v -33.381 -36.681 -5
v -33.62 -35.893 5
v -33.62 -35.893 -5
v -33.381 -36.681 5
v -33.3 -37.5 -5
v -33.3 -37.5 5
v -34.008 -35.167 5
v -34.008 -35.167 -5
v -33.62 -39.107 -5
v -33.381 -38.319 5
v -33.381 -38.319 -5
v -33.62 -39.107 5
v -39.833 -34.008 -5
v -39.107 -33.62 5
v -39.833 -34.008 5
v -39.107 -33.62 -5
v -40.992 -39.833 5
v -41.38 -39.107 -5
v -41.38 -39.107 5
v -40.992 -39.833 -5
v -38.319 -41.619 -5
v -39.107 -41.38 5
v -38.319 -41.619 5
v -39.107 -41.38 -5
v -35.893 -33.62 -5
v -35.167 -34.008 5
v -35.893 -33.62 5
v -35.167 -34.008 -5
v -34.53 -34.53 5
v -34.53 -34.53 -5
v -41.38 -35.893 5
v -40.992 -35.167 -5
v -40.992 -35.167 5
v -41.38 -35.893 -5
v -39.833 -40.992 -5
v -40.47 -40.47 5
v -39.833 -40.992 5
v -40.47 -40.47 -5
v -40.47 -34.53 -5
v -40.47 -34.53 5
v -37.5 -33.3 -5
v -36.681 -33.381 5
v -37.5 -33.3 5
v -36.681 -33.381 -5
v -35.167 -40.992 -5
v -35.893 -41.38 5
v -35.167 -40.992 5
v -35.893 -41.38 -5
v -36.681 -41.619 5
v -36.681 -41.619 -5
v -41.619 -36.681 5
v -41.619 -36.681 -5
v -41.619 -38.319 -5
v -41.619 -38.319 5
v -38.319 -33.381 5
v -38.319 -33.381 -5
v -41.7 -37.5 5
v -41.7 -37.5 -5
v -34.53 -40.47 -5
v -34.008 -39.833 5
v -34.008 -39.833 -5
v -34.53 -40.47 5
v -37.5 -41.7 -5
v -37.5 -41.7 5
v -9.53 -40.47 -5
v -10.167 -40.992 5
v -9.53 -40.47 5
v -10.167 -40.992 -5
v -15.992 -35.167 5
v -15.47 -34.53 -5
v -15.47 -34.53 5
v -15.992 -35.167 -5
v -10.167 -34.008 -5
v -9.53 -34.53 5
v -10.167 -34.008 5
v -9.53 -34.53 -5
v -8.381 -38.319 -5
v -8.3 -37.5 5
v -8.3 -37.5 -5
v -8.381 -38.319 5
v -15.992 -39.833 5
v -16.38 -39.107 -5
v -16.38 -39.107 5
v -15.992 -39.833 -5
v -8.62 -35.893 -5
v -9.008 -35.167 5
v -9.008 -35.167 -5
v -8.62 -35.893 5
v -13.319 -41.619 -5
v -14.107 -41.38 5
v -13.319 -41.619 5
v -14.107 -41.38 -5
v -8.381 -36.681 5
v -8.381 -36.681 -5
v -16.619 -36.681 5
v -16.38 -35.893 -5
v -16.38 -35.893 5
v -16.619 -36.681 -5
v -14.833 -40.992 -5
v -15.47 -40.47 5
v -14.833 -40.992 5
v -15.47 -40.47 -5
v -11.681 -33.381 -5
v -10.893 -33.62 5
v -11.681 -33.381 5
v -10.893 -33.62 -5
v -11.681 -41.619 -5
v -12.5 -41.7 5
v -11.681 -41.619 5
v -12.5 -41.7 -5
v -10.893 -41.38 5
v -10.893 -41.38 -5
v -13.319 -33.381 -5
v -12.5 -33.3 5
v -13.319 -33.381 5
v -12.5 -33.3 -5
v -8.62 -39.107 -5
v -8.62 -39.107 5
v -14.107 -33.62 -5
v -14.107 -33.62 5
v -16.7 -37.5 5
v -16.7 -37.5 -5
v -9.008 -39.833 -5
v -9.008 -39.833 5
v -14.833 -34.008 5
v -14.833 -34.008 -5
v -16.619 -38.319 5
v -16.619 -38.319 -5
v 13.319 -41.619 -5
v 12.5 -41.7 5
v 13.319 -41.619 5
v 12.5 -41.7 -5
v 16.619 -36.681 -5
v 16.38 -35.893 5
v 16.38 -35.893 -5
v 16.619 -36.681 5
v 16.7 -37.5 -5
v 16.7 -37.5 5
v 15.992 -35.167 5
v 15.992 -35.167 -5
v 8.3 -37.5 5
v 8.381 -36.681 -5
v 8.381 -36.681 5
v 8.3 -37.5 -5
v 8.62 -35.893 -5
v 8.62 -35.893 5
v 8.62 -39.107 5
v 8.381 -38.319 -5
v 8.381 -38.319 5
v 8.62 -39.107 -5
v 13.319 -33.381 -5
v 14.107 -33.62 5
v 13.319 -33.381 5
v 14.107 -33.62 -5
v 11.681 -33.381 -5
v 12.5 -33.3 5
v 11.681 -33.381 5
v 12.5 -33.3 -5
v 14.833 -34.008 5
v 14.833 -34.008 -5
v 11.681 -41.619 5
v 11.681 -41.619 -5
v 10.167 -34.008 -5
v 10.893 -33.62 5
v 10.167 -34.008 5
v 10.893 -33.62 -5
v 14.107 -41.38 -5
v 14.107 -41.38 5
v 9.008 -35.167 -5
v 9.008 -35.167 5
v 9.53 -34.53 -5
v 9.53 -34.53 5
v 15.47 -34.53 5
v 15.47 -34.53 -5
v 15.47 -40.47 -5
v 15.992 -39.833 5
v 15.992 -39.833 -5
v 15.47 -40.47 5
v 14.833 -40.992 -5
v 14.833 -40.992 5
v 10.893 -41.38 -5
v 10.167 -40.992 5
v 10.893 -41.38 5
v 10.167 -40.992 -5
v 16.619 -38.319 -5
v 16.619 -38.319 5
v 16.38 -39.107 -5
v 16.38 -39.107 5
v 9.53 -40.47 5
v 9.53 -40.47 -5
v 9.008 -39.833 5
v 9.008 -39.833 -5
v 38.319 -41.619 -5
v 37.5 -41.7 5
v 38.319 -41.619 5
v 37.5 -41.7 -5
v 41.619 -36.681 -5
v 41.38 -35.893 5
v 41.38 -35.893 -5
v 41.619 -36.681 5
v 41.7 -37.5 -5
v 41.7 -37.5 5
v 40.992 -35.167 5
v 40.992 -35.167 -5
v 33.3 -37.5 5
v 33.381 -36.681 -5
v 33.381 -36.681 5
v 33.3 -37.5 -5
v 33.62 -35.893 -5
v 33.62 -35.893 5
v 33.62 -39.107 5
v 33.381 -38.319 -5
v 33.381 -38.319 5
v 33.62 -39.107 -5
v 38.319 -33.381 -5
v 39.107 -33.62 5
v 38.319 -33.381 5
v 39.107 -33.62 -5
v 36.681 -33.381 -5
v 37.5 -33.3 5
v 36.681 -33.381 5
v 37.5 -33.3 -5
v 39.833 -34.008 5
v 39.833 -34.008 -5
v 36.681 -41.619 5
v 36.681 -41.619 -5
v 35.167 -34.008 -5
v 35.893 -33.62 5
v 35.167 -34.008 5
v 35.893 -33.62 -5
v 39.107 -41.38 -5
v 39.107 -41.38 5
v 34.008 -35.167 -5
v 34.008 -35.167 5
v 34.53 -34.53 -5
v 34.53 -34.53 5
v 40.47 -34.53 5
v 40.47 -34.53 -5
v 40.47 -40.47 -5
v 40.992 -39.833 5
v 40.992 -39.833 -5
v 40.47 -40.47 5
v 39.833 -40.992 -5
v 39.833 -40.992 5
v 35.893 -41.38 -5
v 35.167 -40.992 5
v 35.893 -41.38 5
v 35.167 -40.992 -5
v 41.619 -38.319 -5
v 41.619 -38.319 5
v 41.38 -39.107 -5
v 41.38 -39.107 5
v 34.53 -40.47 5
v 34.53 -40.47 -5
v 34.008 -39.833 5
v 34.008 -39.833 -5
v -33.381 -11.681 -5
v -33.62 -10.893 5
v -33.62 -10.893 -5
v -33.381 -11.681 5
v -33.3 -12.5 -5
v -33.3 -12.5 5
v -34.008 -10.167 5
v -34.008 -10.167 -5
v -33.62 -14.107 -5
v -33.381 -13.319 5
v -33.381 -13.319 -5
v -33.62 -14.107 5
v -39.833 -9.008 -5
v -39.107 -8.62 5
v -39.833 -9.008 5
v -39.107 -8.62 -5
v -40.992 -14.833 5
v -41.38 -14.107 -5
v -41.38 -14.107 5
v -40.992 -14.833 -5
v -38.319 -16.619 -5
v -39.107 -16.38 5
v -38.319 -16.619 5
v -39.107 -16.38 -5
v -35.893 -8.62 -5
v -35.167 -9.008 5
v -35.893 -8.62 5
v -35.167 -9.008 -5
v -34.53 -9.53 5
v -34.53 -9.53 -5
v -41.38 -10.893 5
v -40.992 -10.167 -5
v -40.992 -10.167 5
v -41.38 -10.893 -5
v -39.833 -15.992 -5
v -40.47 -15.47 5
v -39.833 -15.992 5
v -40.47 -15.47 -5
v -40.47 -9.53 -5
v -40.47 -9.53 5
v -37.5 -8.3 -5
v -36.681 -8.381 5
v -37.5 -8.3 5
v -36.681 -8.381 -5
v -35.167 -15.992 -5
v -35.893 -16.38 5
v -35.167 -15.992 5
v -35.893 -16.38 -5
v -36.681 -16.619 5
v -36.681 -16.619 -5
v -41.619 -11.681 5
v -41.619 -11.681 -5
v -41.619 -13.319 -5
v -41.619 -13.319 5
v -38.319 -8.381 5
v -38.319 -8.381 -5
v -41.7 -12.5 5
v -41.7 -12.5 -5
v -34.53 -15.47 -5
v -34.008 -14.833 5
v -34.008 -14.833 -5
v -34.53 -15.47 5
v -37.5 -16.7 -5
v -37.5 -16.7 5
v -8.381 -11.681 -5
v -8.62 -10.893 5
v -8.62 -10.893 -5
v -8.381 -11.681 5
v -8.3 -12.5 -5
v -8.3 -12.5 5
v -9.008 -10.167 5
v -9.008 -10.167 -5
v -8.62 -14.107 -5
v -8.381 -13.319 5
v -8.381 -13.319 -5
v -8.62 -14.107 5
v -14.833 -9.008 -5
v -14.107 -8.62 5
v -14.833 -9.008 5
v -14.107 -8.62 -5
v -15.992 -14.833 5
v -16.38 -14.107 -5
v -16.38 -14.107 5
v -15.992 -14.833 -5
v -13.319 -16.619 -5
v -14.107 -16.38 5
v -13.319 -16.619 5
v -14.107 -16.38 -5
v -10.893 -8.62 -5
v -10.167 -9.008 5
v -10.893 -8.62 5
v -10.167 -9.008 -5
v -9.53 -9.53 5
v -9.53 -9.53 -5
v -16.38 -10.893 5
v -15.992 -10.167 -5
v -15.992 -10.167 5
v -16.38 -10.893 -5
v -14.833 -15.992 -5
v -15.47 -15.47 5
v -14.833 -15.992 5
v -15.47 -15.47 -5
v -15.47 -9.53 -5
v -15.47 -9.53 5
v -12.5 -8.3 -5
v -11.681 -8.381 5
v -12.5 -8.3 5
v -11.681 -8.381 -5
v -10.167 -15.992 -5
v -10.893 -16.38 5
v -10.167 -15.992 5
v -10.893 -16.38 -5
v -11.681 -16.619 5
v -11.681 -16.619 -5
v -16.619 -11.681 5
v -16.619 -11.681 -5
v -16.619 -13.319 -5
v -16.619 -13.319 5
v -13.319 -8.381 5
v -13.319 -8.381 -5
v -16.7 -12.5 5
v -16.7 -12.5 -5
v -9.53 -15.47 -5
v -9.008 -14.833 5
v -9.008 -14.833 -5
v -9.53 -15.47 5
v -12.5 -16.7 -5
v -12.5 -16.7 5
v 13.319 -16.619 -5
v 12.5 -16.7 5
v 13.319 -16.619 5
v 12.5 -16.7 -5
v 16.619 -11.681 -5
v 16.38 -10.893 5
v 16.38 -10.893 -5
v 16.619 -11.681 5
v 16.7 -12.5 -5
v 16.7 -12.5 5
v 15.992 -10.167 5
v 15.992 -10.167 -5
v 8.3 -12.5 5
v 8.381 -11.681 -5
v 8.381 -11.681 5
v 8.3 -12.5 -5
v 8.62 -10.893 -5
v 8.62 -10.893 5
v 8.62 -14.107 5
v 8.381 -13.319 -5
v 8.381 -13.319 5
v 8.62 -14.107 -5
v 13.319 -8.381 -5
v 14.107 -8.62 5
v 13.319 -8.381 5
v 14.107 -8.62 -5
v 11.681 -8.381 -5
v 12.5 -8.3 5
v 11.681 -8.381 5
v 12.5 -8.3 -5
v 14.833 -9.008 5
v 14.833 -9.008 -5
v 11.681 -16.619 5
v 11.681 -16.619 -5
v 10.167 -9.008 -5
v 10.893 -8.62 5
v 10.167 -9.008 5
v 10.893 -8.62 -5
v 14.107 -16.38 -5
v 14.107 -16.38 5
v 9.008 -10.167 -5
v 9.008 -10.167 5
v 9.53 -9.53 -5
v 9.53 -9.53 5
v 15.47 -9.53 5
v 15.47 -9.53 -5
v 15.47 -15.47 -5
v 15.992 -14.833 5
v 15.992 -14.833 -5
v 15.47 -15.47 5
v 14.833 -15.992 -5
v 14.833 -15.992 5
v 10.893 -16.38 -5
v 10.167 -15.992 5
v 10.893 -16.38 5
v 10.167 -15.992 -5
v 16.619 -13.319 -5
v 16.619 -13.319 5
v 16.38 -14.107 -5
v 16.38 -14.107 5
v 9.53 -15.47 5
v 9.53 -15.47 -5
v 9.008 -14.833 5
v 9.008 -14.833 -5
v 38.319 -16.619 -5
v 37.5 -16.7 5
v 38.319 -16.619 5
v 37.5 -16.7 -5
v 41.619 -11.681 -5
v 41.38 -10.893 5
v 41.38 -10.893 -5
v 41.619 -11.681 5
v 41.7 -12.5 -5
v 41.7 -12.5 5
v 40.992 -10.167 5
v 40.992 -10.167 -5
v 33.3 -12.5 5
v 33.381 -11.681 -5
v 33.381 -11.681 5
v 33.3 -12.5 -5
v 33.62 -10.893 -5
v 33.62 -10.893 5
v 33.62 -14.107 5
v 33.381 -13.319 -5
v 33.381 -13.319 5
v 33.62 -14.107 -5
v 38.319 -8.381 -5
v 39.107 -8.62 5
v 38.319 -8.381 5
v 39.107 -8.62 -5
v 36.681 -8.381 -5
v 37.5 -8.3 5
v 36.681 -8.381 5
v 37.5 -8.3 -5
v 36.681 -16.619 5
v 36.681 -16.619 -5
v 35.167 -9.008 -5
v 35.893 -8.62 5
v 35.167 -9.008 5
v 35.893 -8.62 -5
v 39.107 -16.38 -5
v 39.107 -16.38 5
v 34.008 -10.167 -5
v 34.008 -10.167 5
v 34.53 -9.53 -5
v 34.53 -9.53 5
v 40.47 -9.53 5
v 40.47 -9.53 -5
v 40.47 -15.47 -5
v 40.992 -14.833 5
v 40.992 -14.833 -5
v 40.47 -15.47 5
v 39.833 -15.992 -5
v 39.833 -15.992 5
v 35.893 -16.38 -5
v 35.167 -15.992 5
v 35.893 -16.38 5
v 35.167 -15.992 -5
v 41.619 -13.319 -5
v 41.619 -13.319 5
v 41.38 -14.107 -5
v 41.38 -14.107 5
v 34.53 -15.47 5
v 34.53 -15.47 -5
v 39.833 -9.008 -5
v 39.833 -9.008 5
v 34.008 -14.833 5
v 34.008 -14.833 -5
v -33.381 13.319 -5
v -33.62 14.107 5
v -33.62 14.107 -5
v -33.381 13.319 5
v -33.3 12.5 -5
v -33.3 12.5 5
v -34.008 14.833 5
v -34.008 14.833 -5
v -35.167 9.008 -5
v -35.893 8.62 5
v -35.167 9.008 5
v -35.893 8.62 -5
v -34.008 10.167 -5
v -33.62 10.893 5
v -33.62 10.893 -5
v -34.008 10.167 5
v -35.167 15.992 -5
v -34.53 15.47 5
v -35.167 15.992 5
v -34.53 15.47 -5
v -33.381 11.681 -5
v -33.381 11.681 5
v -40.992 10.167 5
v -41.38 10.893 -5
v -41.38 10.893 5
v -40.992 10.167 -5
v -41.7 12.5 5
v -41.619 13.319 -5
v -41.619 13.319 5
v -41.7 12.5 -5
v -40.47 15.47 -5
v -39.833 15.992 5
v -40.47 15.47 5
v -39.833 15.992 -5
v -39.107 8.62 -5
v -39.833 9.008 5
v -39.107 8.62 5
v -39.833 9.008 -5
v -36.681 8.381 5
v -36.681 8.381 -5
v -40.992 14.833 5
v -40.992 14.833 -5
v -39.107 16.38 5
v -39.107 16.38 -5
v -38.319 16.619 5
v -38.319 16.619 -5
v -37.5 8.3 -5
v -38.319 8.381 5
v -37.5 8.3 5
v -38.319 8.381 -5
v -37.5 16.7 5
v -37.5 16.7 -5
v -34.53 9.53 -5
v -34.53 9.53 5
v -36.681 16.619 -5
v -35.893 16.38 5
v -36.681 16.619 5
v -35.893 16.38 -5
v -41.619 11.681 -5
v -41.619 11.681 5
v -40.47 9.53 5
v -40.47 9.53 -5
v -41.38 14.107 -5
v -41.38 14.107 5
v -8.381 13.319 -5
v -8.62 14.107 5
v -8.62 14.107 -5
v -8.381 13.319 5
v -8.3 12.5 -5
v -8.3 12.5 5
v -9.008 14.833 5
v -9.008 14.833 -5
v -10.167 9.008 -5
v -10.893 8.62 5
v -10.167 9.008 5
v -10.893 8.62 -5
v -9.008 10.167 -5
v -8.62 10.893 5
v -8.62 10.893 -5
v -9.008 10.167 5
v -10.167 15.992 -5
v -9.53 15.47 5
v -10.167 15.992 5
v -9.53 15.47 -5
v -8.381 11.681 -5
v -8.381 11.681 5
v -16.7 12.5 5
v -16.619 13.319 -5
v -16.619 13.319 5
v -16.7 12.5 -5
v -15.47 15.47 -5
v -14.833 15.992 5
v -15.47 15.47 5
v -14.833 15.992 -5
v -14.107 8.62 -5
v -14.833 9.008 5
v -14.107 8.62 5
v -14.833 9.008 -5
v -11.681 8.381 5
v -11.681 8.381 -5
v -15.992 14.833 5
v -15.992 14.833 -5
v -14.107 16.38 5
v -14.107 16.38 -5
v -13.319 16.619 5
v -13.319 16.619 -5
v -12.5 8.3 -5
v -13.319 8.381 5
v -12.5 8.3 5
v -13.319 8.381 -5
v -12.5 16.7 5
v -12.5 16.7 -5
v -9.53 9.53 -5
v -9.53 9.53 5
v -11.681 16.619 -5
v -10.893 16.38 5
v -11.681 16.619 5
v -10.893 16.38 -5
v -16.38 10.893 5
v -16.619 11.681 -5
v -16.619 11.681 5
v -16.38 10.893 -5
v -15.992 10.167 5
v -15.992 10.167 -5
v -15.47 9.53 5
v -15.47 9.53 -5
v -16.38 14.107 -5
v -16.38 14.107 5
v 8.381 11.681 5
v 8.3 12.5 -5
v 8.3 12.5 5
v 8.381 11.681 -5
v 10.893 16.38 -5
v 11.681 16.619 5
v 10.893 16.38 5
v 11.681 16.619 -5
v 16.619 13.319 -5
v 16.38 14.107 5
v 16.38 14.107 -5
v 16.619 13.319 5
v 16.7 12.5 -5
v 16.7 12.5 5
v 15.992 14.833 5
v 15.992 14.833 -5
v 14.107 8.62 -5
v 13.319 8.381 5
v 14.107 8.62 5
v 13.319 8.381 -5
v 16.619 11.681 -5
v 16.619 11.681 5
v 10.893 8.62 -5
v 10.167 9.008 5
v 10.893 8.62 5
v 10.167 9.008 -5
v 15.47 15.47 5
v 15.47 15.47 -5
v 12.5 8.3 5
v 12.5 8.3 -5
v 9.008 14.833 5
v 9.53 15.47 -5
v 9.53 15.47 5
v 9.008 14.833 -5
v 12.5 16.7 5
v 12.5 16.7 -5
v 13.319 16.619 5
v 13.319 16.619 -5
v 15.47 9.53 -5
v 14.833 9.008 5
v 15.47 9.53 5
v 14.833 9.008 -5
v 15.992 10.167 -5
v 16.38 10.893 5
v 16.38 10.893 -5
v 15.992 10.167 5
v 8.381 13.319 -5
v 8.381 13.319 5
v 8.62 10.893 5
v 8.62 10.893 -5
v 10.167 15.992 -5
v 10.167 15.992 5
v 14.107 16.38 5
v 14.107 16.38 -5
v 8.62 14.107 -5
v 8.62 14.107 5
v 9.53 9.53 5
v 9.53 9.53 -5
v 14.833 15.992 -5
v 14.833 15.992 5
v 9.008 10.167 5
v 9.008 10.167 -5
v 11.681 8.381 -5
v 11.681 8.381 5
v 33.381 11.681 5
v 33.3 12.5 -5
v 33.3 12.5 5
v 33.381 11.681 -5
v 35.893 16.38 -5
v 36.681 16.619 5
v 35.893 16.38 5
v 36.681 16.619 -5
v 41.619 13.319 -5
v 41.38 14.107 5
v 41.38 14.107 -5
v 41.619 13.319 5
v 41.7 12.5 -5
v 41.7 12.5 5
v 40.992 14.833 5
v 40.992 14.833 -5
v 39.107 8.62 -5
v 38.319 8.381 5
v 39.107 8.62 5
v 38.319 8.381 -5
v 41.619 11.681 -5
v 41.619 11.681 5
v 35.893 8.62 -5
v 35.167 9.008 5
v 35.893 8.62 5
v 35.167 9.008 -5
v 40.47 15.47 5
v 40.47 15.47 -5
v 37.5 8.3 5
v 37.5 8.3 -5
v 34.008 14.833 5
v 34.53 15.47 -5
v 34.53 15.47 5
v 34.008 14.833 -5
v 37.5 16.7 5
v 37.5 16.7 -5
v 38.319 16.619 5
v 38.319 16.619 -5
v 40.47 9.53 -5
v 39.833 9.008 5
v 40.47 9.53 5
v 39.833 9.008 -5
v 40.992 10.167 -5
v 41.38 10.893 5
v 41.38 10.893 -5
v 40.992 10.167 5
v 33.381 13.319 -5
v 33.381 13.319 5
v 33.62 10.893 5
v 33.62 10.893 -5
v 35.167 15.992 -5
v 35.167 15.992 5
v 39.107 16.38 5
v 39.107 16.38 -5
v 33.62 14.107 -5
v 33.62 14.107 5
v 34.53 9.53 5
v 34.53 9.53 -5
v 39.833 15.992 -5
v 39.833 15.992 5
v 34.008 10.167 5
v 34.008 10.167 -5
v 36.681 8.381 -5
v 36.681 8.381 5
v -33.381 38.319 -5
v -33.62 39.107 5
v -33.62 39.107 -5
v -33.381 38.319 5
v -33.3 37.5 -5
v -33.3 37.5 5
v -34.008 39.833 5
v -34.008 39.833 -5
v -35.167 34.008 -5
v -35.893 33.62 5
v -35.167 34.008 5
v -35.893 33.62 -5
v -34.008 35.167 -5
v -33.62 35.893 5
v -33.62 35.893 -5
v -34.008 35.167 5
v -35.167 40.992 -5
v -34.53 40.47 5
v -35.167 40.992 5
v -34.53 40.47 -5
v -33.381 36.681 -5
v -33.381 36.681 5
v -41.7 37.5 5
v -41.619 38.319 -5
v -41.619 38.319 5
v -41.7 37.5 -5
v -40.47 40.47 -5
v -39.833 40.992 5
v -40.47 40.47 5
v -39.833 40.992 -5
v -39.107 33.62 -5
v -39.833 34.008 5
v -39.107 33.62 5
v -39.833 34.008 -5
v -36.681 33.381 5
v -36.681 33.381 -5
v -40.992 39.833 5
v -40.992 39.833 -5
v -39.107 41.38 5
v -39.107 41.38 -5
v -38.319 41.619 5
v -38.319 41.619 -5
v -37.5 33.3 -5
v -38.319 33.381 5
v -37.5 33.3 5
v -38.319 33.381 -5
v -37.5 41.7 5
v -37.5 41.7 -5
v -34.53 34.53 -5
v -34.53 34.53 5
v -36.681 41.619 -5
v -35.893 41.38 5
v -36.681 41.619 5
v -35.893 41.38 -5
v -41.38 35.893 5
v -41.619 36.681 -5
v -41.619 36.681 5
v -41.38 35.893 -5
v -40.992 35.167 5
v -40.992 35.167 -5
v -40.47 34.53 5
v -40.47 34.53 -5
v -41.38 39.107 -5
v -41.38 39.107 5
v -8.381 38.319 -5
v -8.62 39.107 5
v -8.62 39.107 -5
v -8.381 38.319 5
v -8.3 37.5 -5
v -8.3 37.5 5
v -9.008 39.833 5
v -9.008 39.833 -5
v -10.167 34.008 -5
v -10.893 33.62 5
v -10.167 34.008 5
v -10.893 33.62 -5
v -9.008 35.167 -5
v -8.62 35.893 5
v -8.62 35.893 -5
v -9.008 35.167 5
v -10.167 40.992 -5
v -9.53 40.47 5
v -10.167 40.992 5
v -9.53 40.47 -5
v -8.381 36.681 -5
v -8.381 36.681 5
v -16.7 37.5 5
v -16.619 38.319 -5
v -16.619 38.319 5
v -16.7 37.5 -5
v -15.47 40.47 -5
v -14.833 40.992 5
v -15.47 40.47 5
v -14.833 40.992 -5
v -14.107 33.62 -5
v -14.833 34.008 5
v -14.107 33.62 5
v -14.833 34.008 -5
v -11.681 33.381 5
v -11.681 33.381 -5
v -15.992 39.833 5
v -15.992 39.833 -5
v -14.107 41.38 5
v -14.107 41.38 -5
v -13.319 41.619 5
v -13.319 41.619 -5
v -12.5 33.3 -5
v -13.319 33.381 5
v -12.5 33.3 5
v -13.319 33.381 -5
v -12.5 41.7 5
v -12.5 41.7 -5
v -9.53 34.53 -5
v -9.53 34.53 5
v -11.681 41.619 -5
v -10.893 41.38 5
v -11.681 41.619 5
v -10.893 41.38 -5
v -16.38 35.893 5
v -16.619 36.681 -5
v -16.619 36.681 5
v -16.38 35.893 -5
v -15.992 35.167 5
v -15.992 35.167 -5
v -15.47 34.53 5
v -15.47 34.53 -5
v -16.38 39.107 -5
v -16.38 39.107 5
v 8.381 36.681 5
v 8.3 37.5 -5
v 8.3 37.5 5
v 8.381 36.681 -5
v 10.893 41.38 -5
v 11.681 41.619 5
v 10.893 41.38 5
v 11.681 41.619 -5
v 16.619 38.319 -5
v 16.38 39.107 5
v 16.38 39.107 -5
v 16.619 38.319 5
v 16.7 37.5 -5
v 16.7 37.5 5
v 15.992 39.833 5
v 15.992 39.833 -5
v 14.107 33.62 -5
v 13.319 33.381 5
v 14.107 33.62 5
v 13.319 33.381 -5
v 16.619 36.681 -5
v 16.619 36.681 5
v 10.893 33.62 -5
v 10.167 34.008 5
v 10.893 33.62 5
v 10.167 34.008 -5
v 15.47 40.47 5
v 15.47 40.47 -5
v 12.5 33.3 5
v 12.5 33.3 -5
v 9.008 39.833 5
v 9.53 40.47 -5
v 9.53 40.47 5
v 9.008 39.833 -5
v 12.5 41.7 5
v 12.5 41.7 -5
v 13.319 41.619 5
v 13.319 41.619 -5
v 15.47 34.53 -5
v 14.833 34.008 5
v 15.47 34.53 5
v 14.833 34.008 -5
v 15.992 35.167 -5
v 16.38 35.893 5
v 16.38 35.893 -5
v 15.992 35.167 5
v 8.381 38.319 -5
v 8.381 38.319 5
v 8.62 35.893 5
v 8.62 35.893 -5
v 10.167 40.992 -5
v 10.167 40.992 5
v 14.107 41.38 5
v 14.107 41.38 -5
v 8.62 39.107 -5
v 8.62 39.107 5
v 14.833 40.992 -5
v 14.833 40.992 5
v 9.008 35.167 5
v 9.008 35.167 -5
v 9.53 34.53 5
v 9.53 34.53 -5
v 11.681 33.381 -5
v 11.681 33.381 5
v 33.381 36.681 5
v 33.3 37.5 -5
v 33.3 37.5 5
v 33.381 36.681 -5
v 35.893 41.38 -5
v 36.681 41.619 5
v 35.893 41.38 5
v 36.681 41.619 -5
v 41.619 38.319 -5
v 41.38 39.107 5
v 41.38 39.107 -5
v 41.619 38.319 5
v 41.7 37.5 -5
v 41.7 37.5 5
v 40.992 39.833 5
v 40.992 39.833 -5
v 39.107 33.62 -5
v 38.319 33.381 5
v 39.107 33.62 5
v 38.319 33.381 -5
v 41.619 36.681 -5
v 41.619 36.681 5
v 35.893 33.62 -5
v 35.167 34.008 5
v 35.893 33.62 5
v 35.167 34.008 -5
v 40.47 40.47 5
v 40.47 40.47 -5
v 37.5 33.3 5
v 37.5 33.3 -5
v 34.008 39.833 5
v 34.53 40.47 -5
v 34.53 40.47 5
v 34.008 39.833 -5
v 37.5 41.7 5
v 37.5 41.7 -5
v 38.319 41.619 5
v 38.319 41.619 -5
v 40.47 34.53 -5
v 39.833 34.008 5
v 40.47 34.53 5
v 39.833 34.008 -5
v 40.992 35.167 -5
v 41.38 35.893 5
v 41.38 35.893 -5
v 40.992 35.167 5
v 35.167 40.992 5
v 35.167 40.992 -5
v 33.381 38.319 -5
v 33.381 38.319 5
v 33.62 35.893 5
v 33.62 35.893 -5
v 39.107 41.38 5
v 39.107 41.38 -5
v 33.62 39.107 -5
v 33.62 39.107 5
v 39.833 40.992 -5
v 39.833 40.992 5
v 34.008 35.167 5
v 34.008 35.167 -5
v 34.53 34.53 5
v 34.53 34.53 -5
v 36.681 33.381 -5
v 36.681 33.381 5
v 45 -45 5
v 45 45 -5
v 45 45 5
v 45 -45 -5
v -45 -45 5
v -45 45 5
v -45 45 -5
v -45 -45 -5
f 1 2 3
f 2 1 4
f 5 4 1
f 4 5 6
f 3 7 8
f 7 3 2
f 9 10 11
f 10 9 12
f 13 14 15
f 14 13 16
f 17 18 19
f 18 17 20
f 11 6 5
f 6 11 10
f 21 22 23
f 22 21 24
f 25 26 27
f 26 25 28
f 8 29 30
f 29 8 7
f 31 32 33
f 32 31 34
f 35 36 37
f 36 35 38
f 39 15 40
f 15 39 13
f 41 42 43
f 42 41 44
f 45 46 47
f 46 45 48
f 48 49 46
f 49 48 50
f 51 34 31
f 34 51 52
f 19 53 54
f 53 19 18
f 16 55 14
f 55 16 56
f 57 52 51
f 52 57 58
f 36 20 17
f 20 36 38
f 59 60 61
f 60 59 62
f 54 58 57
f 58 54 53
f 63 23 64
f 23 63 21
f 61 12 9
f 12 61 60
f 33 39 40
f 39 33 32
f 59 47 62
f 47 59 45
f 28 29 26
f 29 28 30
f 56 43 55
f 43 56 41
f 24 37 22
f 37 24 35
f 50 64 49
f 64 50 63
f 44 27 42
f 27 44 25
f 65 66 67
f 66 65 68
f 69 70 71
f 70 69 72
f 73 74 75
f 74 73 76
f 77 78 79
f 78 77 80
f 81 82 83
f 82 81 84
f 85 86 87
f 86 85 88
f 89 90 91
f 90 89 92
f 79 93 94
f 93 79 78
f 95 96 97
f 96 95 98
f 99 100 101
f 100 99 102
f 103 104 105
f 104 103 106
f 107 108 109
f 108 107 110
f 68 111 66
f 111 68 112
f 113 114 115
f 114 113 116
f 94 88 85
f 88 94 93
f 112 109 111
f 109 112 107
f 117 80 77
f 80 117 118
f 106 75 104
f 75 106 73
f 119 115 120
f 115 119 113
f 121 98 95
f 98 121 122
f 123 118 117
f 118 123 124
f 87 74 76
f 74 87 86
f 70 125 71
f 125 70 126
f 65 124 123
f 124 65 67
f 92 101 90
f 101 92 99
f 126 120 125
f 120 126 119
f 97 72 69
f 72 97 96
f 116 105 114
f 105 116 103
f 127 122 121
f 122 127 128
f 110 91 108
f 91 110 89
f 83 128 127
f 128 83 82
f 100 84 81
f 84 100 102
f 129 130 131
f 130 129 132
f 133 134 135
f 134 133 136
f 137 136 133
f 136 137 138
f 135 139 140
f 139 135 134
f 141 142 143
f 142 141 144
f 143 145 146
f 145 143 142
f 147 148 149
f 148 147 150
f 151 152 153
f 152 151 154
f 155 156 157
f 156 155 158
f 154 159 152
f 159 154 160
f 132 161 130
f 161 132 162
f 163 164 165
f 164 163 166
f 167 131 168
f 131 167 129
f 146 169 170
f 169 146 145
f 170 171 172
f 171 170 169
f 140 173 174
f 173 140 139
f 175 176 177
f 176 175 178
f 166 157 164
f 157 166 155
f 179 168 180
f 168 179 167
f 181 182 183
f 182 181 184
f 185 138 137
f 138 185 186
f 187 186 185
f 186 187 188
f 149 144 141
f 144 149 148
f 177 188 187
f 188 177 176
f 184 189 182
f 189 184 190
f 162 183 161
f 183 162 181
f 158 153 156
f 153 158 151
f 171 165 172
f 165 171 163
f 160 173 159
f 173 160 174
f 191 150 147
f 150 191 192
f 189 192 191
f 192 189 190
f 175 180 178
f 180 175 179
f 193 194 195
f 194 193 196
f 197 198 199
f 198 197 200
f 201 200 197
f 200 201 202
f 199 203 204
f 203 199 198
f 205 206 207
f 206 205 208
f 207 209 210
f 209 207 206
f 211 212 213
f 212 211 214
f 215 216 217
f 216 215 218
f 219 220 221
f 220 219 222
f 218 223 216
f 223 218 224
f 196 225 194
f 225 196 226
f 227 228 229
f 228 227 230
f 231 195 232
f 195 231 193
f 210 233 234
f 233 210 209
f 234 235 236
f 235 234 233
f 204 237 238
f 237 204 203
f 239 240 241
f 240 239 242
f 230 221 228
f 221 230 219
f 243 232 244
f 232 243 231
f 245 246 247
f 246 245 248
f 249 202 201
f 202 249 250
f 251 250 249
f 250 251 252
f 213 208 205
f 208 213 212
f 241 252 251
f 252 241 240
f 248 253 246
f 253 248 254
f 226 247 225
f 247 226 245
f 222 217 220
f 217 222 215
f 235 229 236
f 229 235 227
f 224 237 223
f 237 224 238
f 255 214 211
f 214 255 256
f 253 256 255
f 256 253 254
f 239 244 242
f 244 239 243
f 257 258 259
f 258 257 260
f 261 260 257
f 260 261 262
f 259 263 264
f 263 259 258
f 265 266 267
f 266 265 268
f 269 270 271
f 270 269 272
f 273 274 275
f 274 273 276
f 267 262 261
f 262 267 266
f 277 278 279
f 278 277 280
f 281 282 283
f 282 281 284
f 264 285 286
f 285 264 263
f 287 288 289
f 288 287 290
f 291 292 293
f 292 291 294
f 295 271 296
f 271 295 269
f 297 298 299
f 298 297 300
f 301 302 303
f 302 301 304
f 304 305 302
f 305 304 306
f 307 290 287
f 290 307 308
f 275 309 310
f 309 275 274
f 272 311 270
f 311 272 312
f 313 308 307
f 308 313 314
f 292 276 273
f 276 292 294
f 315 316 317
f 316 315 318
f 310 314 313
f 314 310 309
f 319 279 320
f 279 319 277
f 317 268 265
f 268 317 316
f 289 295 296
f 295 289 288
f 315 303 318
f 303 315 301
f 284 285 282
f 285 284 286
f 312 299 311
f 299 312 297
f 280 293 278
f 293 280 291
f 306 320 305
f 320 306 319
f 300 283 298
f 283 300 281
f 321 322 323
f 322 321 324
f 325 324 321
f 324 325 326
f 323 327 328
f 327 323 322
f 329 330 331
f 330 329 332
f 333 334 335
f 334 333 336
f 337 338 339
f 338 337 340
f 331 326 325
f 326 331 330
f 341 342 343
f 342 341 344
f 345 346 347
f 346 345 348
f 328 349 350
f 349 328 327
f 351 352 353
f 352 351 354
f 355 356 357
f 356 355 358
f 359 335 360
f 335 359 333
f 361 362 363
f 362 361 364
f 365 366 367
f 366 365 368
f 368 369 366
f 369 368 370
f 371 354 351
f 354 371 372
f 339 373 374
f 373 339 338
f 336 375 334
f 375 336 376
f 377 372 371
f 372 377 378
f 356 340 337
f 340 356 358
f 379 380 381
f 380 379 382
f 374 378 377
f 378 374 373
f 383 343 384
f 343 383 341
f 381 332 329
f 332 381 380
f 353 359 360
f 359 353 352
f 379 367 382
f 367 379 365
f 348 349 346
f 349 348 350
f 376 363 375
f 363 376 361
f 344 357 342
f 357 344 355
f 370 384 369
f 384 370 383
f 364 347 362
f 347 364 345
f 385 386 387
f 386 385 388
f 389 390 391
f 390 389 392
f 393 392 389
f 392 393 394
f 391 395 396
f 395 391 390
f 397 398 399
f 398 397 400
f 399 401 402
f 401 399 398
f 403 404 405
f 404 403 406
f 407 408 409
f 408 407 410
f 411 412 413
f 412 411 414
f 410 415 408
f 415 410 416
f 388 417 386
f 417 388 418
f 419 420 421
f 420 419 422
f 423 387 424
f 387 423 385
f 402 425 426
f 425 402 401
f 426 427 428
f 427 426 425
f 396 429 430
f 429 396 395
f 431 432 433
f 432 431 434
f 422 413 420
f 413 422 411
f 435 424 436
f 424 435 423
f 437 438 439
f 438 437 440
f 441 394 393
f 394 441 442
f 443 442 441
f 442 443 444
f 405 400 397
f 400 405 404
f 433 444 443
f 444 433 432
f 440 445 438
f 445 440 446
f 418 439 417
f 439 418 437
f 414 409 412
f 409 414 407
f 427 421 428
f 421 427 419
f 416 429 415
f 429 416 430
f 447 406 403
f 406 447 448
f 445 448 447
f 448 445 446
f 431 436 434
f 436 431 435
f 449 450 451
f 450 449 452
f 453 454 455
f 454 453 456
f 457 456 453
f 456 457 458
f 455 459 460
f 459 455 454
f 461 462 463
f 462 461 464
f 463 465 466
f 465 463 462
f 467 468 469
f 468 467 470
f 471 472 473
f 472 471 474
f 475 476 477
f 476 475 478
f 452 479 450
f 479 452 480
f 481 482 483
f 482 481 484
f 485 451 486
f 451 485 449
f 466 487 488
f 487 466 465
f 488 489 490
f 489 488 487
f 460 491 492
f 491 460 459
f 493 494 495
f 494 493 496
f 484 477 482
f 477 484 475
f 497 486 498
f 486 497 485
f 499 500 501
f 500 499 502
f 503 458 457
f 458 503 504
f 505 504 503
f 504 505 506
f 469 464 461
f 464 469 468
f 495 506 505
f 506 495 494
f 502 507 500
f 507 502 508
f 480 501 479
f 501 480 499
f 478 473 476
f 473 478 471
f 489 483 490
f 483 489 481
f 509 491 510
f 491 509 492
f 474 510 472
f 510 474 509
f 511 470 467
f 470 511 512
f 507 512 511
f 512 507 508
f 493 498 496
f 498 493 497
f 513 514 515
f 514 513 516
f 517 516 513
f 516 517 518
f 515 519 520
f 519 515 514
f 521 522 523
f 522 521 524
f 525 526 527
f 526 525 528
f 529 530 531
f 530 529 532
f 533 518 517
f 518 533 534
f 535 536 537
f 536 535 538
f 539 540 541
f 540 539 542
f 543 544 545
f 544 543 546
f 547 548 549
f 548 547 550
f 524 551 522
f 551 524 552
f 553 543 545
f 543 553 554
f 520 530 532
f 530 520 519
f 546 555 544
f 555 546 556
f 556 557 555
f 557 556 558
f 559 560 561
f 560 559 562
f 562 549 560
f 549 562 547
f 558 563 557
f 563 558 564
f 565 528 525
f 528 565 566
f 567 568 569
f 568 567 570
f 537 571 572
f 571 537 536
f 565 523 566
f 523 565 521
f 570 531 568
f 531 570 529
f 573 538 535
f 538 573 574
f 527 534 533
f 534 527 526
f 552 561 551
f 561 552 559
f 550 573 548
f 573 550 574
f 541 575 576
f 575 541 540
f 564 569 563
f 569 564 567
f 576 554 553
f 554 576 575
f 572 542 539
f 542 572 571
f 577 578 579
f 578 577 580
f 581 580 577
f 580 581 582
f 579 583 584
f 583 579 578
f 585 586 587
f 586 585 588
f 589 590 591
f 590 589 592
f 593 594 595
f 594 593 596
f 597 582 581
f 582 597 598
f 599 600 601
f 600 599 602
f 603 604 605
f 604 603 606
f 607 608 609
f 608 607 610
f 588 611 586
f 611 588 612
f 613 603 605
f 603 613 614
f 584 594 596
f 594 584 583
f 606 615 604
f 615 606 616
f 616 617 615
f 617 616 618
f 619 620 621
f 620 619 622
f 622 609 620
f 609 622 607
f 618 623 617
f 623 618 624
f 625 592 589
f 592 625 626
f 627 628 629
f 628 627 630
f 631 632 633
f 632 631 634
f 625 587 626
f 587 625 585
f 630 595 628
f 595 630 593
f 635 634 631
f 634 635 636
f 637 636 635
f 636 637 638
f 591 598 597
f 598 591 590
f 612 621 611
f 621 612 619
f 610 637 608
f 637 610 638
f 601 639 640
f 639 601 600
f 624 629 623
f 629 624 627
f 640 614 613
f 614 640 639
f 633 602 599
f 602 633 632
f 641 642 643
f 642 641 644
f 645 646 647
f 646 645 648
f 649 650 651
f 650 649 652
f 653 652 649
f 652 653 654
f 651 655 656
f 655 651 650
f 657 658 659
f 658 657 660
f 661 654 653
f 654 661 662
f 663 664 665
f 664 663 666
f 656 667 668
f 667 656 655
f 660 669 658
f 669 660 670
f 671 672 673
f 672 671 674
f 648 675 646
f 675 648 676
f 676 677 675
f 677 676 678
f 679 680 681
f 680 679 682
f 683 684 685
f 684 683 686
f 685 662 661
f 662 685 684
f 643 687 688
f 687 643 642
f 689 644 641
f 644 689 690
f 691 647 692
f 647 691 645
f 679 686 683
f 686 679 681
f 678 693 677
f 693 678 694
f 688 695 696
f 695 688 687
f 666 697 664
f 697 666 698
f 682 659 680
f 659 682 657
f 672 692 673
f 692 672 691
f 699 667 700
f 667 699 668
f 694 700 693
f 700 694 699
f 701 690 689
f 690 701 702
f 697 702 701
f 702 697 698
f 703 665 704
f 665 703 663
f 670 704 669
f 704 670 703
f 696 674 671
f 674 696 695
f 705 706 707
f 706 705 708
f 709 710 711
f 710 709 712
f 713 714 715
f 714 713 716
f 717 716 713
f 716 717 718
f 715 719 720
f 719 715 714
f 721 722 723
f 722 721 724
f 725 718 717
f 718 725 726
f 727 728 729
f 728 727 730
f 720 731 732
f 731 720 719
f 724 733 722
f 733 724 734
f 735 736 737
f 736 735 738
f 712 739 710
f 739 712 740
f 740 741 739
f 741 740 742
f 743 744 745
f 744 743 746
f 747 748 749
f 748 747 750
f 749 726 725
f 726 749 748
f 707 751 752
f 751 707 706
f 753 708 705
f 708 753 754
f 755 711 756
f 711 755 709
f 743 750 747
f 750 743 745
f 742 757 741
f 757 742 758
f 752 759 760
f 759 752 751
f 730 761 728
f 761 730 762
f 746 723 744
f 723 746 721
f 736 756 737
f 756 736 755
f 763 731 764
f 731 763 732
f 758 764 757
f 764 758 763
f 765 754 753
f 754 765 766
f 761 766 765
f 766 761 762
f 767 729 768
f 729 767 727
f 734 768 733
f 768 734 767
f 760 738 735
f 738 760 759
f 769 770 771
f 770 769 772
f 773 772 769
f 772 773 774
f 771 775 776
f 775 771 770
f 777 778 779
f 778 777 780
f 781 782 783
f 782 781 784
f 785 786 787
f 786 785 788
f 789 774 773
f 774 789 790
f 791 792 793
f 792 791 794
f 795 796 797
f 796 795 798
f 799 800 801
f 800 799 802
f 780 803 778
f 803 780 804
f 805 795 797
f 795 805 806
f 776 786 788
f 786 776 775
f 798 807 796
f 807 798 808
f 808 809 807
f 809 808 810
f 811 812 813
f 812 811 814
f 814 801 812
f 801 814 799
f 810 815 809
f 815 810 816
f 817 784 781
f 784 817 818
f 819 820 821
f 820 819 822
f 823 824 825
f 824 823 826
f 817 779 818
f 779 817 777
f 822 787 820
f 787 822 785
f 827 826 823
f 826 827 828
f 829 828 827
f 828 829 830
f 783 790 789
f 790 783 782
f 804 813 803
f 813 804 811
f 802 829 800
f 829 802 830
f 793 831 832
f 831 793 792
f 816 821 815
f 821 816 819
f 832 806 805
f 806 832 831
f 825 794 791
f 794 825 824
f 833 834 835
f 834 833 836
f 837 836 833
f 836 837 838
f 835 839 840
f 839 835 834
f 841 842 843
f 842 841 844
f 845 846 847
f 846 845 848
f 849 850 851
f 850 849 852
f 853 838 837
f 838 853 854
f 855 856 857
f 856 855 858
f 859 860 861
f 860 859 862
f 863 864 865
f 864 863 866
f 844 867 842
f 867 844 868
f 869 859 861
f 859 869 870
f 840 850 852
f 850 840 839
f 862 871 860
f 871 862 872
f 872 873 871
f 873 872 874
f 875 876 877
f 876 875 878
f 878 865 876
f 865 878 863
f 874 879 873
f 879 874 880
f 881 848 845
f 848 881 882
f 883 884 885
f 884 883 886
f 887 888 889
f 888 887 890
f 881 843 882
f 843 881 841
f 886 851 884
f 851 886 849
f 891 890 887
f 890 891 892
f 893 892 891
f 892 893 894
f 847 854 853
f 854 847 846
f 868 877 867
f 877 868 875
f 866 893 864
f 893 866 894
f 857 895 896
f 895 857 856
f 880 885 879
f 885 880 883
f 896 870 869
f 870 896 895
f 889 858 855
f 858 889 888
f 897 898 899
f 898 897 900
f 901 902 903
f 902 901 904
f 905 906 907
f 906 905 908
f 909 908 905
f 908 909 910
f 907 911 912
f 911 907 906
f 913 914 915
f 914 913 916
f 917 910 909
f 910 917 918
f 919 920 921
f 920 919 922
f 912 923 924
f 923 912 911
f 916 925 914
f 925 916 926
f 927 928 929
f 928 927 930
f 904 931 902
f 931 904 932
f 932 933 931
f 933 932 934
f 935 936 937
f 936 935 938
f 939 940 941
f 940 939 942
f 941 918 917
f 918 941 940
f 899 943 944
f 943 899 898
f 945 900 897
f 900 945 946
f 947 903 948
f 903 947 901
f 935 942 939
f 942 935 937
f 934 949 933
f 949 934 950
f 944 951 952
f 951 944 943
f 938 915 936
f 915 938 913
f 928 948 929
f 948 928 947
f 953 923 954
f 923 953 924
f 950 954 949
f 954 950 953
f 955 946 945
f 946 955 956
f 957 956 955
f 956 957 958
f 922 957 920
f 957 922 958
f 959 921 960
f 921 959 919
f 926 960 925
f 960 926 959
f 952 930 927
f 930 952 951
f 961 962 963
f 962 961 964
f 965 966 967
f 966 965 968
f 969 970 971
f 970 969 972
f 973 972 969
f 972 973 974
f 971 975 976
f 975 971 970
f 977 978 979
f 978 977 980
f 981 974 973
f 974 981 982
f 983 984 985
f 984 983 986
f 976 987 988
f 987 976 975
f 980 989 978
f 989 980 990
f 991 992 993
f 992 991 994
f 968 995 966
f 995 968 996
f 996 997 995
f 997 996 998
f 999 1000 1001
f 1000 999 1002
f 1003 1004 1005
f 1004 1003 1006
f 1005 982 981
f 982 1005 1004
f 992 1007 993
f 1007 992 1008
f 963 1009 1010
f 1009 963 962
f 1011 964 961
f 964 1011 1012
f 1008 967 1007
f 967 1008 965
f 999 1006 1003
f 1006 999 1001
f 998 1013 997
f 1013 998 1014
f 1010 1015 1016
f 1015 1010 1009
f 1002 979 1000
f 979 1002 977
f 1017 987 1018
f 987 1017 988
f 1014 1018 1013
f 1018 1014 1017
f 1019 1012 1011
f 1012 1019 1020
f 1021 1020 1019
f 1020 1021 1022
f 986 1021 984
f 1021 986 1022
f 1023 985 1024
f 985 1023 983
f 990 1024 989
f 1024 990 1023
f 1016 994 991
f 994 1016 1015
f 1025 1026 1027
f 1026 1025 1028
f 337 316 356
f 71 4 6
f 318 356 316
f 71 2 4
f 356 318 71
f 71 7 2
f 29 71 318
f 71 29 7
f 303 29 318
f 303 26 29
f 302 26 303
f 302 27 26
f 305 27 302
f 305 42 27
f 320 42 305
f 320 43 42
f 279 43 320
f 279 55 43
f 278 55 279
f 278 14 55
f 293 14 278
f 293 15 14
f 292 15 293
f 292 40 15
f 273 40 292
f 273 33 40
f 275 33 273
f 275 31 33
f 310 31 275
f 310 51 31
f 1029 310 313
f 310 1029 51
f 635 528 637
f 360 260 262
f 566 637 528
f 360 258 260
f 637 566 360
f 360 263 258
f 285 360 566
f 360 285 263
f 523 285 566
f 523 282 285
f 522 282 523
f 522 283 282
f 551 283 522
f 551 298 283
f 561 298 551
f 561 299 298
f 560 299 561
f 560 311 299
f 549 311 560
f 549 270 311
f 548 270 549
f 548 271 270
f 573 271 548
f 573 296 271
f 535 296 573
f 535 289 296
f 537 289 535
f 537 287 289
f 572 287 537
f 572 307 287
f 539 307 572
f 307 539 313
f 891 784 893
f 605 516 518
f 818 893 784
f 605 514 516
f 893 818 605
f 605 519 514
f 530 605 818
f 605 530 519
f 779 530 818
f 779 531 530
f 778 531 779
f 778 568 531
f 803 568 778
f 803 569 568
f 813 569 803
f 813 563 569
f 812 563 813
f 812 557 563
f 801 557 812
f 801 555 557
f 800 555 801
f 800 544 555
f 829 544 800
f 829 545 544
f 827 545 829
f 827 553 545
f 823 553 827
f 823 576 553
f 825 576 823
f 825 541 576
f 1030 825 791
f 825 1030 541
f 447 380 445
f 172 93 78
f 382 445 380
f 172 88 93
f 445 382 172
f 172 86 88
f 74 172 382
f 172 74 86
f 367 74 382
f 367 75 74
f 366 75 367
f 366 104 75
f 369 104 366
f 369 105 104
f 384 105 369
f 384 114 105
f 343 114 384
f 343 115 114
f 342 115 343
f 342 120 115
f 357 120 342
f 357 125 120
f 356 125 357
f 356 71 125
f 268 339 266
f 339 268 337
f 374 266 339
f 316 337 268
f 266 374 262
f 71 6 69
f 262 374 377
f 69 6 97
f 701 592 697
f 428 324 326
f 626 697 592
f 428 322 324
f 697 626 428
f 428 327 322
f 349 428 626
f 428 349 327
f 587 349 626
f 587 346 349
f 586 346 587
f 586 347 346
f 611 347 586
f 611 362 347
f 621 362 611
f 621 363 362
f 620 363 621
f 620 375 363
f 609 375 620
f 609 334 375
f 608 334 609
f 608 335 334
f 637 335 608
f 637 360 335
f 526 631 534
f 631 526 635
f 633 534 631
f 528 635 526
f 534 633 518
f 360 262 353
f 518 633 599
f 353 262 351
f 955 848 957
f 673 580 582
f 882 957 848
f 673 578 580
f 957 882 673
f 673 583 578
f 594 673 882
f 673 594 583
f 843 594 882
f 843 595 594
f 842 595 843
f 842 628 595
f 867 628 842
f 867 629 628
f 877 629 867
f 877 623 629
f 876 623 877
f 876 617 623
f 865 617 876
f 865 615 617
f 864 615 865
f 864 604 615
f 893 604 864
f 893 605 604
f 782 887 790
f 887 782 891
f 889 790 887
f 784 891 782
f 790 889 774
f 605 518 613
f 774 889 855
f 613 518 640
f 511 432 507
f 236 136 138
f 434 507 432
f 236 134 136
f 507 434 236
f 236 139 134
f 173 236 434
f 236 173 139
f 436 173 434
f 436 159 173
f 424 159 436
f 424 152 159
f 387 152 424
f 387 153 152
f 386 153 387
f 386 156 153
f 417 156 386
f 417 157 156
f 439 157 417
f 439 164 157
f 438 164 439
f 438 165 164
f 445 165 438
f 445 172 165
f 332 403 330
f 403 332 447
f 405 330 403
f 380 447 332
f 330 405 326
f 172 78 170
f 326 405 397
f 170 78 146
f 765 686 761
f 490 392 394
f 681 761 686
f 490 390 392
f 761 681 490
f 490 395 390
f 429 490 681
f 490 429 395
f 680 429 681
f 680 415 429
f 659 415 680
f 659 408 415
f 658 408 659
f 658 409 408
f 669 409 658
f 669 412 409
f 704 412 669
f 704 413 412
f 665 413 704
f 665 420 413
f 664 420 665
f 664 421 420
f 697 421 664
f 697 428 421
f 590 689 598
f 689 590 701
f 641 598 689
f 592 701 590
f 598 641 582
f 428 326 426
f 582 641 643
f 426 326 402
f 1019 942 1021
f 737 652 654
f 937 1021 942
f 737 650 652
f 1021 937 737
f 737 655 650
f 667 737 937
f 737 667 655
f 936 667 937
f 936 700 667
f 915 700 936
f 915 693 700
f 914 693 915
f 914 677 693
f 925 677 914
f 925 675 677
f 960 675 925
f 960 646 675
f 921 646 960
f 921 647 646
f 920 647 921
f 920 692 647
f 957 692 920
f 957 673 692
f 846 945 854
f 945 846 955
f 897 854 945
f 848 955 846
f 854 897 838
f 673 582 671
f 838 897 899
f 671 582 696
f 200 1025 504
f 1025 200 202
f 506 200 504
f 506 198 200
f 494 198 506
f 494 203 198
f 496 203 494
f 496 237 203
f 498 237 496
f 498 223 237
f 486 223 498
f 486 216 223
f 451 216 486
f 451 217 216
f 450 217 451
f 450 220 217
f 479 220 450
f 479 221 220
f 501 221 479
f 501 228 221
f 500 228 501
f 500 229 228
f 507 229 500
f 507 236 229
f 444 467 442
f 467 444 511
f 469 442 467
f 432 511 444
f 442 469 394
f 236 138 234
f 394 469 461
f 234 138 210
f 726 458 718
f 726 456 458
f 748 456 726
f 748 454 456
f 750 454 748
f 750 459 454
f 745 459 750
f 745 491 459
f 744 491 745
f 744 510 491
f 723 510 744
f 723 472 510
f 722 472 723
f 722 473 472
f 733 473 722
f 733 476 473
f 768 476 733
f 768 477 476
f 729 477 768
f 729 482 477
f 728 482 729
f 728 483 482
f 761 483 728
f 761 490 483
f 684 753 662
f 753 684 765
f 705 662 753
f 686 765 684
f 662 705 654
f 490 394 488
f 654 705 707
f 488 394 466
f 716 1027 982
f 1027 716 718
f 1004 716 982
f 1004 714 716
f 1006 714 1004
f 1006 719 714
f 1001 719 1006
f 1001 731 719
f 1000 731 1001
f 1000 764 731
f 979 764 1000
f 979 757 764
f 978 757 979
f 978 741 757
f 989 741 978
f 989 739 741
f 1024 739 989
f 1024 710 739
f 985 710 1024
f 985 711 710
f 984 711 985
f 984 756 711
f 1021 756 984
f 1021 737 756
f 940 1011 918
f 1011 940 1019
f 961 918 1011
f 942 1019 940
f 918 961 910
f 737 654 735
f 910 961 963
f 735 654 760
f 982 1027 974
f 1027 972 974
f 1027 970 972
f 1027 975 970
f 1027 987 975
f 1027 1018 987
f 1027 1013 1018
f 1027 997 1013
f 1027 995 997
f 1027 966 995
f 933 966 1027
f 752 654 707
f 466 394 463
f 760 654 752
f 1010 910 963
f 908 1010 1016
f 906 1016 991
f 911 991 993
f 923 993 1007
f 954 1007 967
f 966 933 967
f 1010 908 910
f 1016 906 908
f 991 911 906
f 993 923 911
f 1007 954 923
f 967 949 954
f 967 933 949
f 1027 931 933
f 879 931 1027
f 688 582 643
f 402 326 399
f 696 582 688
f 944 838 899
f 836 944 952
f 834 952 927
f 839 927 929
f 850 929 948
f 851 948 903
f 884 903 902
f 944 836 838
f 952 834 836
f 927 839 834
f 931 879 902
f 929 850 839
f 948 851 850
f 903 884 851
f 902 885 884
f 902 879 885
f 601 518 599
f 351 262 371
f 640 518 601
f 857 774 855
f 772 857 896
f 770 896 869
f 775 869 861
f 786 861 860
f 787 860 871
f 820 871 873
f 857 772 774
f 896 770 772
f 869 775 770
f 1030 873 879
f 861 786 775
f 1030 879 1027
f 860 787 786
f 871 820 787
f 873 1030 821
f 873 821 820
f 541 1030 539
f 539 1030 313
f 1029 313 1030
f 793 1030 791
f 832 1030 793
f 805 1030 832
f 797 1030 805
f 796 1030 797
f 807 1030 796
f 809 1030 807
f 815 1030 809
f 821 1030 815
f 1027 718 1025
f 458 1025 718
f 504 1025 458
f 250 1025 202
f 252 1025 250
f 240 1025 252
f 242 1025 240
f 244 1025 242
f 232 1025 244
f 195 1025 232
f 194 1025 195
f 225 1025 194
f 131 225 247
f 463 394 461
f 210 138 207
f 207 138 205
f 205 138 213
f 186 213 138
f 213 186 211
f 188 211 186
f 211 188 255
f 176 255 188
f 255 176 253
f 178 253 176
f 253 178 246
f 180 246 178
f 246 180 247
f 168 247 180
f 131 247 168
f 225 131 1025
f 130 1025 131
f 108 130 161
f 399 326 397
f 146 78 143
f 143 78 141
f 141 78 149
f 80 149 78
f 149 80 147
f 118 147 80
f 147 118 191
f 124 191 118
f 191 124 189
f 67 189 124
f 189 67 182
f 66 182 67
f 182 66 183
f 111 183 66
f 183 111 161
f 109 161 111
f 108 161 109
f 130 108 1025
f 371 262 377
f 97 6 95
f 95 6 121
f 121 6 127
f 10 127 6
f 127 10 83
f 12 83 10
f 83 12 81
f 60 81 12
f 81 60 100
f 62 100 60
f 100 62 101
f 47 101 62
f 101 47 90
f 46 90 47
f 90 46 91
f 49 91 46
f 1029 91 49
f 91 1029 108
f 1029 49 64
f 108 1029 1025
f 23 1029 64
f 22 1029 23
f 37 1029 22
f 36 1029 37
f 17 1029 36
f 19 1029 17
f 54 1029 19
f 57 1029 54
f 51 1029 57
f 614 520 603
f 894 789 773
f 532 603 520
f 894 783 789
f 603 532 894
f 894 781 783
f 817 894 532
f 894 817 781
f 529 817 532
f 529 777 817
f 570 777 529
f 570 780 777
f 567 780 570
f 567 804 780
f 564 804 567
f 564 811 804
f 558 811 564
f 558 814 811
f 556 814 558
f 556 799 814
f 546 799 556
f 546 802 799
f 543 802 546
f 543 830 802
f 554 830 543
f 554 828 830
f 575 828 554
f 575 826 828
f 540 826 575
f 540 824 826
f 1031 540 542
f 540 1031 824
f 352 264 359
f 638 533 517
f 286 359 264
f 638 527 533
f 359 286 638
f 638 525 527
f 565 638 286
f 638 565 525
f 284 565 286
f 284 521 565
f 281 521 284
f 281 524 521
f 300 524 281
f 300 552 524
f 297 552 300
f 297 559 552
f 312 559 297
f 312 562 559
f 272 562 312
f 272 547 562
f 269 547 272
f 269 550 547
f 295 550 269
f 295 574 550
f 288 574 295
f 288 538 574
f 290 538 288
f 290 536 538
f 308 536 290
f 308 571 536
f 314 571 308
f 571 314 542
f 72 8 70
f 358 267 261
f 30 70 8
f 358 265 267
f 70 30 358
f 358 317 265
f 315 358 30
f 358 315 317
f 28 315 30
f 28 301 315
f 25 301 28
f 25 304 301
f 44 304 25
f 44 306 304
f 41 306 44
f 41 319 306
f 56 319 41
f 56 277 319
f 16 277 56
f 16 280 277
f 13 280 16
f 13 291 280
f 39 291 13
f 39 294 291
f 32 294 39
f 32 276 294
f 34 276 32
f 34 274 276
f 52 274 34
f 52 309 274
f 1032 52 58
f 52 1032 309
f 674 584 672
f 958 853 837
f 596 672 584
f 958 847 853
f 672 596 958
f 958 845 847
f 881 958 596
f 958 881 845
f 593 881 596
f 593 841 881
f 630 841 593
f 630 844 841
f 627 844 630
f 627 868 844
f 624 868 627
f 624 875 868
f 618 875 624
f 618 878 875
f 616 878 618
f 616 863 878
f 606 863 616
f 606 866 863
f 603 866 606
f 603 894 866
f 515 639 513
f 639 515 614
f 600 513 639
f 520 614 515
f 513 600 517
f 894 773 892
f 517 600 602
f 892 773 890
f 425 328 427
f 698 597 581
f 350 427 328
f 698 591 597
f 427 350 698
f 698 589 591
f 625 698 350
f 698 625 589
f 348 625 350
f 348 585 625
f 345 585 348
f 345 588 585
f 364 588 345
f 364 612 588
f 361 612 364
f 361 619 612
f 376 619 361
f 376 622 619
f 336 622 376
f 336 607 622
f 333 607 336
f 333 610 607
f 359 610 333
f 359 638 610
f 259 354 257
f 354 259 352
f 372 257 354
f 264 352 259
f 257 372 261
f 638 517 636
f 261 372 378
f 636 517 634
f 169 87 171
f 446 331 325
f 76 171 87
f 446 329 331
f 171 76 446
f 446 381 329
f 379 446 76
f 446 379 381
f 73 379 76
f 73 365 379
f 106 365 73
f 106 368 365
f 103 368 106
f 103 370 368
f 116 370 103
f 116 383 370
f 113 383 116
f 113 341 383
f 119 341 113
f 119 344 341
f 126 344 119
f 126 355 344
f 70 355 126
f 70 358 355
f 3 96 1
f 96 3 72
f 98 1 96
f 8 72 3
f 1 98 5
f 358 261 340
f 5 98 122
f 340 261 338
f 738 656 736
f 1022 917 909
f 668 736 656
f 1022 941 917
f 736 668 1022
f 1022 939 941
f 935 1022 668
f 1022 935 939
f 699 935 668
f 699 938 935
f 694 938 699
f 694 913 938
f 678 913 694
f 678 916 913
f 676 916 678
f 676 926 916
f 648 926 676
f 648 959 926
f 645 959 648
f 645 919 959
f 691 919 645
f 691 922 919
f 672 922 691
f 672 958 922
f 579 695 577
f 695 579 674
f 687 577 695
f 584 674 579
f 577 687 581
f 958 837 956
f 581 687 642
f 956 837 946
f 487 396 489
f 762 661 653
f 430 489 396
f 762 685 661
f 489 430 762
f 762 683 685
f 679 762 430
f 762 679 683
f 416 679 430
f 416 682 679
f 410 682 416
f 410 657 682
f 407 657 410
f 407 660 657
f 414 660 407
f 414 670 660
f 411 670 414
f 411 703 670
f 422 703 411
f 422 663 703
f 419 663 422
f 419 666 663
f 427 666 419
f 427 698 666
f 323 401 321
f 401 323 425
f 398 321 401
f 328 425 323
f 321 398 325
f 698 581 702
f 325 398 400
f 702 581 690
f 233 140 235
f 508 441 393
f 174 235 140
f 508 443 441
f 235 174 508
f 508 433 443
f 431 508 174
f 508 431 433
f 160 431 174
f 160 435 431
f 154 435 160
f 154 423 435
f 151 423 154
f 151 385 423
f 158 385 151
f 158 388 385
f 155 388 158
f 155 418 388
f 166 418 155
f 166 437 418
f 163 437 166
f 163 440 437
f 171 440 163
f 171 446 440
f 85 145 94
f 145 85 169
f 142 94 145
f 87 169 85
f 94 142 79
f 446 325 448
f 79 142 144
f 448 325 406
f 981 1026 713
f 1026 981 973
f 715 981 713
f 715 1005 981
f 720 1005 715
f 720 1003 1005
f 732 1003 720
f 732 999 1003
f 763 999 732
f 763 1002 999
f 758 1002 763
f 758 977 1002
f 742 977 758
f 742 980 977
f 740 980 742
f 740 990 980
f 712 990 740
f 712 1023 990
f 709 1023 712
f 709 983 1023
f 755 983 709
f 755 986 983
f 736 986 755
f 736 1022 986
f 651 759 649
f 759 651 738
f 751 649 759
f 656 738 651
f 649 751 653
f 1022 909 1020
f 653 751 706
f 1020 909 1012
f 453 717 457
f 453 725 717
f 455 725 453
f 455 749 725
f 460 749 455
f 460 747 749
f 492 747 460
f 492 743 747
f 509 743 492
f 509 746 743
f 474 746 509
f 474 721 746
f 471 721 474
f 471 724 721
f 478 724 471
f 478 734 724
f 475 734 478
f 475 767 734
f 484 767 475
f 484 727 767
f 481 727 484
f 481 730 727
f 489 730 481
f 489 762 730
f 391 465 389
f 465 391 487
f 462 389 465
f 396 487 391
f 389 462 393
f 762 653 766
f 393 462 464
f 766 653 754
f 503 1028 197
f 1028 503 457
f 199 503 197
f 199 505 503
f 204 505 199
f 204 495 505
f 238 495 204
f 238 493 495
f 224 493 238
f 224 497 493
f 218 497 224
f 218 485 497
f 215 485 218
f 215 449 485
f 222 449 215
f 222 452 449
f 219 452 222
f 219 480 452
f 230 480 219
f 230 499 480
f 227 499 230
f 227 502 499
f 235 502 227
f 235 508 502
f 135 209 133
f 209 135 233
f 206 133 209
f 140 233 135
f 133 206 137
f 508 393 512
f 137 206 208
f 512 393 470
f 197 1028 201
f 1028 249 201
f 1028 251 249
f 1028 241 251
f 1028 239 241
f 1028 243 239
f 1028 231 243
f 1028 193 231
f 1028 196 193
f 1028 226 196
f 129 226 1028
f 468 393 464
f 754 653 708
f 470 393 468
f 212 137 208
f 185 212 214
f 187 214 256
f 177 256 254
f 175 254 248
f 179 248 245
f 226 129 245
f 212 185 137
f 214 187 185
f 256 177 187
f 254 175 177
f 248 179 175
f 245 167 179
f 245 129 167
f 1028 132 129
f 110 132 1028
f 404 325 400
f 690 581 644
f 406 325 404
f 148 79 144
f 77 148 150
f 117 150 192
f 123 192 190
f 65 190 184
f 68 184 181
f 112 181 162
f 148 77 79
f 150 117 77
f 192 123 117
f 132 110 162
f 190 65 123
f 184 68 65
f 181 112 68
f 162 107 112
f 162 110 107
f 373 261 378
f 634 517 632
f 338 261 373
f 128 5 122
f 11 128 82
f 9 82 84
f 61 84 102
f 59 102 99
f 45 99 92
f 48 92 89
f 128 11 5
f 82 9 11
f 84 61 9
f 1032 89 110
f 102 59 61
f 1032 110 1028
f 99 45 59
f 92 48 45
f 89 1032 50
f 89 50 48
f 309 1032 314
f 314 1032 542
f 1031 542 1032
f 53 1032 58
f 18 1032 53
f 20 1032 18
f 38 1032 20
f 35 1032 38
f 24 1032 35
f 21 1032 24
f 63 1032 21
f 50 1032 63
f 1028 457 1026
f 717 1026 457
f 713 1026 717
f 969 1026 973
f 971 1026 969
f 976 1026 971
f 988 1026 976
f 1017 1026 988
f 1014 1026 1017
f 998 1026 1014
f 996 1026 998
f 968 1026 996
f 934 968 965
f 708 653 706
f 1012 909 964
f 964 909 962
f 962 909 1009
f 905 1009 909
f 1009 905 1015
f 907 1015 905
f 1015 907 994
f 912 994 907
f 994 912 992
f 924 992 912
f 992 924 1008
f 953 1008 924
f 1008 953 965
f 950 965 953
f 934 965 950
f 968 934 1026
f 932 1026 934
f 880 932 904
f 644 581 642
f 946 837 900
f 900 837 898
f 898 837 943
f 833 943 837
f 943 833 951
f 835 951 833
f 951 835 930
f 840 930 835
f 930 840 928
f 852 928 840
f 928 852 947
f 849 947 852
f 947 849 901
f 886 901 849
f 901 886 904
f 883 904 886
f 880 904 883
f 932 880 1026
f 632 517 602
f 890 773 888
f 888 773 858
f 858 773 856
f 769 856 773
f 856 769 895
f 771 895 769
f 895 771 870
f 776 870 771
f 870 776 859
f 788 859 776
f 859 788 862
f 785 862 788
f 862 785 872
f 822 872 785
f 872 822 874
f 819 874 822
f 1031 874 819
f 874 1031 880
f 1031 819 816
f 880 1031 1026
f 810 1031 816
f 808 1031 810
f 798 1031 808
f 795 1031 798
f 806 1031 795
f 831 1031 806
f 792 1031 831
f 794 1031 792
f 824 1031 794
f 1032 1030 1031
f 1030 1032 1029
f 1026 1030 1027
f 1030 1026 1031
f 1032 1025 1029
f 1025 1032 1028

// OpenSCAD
$fn = 32;

// ----------------------------------------------------------------------
// Perforated panel 90 x 90 x 10
// 4 x 4 Ø8.4 holes, grid layout
// ----------------------------------------------------------------------

// --- parameters (mm) ---
panel = [90, 90, 10];  // overall size (x, y, z)
hole_d = 8.4;          // hole diameter
pitch_x = 25;          // hole pitch along X
pitch_y = 25;          // hole pitch along Y

// --- derived feature positions (mm) ---
margin = hole_d / 2 + 2;            // = 6.2   clearance from the panel edge
cols = floor((panel[0] - 2 * margin) / pitch_x) + 1;  // = 4   how many columns fit in X
rows = floor((panel[1] - 2 * margin) / pitch_y) + 1;  // = 4   how many rows fit in Y
span_x = (cols - 1) * pitch_x + 0;  // = 75   width of the field
span_y = (rows - 1) * pitch_y;      // = 75   height of the field
origin_x = -span_x / 2;             // = -37.5   X of the first hole
origin_y = -span_y / 2;             // = -37.5   Y of the first row
holes = rows * cols;                // = 16   holes in total
feature_centers = [
  [origin_x + 0 * pitch_x, origin_y + 0 * pitch_y],
  [origin_x + 1 * pitch_x, origin_y + 0 * pitch_y],
  [origin_x + 2 * pitch_x, origin_y + 0 * pitch_y],
  [origin_x + 3 * pitch_x, origin_y + 0 * pitch_y],
  [origin_x + 0 * pitch_x, origin_y + 1 * pitch_y],
  [origin_x + 1 * pitch_x, origin_y + 1 * pitch_y],
  [origin_x + 2 * pitch_x, origin_y + 1 * pitch_y],
  [origin_x + 3 * pitch_x, origin_y + 1 * pitch_y],
  [origin_x + 0 * pitch_x, origin_y + 2 * pitch_y],
  [origin_x + 1 * pitch_x, origin_y + 2 * pitch_y],
  [origin_x + 2 * pitch_x, origin_y + 2 * pitch_y],
  [origin_x + 3 * pitch_x, origin_y + 2 * pitch_y],
  [origin_x + 0 * pitch_x, origin_y + 3 * pitch_y],
  [origin_x + 1 * pitch_x, origin_y + 3 * pitch_y],
  [origin_x + 2 * pitch_x, origin_y + 3 * pitch_y],
  [origin_x + 3 * pitch_x, origin_y + 3 * pitch_y]
];   // hole centres, used verbatim by the cutter loop

// panel outline, every hole through
difference() {
  cube(panel, center = true);
  for (centre = feature_centers)
    translate([centre[0], centre[1], 0])
      cylinder(d = hole_d, h = panel[2] + 2, center = true);
}
